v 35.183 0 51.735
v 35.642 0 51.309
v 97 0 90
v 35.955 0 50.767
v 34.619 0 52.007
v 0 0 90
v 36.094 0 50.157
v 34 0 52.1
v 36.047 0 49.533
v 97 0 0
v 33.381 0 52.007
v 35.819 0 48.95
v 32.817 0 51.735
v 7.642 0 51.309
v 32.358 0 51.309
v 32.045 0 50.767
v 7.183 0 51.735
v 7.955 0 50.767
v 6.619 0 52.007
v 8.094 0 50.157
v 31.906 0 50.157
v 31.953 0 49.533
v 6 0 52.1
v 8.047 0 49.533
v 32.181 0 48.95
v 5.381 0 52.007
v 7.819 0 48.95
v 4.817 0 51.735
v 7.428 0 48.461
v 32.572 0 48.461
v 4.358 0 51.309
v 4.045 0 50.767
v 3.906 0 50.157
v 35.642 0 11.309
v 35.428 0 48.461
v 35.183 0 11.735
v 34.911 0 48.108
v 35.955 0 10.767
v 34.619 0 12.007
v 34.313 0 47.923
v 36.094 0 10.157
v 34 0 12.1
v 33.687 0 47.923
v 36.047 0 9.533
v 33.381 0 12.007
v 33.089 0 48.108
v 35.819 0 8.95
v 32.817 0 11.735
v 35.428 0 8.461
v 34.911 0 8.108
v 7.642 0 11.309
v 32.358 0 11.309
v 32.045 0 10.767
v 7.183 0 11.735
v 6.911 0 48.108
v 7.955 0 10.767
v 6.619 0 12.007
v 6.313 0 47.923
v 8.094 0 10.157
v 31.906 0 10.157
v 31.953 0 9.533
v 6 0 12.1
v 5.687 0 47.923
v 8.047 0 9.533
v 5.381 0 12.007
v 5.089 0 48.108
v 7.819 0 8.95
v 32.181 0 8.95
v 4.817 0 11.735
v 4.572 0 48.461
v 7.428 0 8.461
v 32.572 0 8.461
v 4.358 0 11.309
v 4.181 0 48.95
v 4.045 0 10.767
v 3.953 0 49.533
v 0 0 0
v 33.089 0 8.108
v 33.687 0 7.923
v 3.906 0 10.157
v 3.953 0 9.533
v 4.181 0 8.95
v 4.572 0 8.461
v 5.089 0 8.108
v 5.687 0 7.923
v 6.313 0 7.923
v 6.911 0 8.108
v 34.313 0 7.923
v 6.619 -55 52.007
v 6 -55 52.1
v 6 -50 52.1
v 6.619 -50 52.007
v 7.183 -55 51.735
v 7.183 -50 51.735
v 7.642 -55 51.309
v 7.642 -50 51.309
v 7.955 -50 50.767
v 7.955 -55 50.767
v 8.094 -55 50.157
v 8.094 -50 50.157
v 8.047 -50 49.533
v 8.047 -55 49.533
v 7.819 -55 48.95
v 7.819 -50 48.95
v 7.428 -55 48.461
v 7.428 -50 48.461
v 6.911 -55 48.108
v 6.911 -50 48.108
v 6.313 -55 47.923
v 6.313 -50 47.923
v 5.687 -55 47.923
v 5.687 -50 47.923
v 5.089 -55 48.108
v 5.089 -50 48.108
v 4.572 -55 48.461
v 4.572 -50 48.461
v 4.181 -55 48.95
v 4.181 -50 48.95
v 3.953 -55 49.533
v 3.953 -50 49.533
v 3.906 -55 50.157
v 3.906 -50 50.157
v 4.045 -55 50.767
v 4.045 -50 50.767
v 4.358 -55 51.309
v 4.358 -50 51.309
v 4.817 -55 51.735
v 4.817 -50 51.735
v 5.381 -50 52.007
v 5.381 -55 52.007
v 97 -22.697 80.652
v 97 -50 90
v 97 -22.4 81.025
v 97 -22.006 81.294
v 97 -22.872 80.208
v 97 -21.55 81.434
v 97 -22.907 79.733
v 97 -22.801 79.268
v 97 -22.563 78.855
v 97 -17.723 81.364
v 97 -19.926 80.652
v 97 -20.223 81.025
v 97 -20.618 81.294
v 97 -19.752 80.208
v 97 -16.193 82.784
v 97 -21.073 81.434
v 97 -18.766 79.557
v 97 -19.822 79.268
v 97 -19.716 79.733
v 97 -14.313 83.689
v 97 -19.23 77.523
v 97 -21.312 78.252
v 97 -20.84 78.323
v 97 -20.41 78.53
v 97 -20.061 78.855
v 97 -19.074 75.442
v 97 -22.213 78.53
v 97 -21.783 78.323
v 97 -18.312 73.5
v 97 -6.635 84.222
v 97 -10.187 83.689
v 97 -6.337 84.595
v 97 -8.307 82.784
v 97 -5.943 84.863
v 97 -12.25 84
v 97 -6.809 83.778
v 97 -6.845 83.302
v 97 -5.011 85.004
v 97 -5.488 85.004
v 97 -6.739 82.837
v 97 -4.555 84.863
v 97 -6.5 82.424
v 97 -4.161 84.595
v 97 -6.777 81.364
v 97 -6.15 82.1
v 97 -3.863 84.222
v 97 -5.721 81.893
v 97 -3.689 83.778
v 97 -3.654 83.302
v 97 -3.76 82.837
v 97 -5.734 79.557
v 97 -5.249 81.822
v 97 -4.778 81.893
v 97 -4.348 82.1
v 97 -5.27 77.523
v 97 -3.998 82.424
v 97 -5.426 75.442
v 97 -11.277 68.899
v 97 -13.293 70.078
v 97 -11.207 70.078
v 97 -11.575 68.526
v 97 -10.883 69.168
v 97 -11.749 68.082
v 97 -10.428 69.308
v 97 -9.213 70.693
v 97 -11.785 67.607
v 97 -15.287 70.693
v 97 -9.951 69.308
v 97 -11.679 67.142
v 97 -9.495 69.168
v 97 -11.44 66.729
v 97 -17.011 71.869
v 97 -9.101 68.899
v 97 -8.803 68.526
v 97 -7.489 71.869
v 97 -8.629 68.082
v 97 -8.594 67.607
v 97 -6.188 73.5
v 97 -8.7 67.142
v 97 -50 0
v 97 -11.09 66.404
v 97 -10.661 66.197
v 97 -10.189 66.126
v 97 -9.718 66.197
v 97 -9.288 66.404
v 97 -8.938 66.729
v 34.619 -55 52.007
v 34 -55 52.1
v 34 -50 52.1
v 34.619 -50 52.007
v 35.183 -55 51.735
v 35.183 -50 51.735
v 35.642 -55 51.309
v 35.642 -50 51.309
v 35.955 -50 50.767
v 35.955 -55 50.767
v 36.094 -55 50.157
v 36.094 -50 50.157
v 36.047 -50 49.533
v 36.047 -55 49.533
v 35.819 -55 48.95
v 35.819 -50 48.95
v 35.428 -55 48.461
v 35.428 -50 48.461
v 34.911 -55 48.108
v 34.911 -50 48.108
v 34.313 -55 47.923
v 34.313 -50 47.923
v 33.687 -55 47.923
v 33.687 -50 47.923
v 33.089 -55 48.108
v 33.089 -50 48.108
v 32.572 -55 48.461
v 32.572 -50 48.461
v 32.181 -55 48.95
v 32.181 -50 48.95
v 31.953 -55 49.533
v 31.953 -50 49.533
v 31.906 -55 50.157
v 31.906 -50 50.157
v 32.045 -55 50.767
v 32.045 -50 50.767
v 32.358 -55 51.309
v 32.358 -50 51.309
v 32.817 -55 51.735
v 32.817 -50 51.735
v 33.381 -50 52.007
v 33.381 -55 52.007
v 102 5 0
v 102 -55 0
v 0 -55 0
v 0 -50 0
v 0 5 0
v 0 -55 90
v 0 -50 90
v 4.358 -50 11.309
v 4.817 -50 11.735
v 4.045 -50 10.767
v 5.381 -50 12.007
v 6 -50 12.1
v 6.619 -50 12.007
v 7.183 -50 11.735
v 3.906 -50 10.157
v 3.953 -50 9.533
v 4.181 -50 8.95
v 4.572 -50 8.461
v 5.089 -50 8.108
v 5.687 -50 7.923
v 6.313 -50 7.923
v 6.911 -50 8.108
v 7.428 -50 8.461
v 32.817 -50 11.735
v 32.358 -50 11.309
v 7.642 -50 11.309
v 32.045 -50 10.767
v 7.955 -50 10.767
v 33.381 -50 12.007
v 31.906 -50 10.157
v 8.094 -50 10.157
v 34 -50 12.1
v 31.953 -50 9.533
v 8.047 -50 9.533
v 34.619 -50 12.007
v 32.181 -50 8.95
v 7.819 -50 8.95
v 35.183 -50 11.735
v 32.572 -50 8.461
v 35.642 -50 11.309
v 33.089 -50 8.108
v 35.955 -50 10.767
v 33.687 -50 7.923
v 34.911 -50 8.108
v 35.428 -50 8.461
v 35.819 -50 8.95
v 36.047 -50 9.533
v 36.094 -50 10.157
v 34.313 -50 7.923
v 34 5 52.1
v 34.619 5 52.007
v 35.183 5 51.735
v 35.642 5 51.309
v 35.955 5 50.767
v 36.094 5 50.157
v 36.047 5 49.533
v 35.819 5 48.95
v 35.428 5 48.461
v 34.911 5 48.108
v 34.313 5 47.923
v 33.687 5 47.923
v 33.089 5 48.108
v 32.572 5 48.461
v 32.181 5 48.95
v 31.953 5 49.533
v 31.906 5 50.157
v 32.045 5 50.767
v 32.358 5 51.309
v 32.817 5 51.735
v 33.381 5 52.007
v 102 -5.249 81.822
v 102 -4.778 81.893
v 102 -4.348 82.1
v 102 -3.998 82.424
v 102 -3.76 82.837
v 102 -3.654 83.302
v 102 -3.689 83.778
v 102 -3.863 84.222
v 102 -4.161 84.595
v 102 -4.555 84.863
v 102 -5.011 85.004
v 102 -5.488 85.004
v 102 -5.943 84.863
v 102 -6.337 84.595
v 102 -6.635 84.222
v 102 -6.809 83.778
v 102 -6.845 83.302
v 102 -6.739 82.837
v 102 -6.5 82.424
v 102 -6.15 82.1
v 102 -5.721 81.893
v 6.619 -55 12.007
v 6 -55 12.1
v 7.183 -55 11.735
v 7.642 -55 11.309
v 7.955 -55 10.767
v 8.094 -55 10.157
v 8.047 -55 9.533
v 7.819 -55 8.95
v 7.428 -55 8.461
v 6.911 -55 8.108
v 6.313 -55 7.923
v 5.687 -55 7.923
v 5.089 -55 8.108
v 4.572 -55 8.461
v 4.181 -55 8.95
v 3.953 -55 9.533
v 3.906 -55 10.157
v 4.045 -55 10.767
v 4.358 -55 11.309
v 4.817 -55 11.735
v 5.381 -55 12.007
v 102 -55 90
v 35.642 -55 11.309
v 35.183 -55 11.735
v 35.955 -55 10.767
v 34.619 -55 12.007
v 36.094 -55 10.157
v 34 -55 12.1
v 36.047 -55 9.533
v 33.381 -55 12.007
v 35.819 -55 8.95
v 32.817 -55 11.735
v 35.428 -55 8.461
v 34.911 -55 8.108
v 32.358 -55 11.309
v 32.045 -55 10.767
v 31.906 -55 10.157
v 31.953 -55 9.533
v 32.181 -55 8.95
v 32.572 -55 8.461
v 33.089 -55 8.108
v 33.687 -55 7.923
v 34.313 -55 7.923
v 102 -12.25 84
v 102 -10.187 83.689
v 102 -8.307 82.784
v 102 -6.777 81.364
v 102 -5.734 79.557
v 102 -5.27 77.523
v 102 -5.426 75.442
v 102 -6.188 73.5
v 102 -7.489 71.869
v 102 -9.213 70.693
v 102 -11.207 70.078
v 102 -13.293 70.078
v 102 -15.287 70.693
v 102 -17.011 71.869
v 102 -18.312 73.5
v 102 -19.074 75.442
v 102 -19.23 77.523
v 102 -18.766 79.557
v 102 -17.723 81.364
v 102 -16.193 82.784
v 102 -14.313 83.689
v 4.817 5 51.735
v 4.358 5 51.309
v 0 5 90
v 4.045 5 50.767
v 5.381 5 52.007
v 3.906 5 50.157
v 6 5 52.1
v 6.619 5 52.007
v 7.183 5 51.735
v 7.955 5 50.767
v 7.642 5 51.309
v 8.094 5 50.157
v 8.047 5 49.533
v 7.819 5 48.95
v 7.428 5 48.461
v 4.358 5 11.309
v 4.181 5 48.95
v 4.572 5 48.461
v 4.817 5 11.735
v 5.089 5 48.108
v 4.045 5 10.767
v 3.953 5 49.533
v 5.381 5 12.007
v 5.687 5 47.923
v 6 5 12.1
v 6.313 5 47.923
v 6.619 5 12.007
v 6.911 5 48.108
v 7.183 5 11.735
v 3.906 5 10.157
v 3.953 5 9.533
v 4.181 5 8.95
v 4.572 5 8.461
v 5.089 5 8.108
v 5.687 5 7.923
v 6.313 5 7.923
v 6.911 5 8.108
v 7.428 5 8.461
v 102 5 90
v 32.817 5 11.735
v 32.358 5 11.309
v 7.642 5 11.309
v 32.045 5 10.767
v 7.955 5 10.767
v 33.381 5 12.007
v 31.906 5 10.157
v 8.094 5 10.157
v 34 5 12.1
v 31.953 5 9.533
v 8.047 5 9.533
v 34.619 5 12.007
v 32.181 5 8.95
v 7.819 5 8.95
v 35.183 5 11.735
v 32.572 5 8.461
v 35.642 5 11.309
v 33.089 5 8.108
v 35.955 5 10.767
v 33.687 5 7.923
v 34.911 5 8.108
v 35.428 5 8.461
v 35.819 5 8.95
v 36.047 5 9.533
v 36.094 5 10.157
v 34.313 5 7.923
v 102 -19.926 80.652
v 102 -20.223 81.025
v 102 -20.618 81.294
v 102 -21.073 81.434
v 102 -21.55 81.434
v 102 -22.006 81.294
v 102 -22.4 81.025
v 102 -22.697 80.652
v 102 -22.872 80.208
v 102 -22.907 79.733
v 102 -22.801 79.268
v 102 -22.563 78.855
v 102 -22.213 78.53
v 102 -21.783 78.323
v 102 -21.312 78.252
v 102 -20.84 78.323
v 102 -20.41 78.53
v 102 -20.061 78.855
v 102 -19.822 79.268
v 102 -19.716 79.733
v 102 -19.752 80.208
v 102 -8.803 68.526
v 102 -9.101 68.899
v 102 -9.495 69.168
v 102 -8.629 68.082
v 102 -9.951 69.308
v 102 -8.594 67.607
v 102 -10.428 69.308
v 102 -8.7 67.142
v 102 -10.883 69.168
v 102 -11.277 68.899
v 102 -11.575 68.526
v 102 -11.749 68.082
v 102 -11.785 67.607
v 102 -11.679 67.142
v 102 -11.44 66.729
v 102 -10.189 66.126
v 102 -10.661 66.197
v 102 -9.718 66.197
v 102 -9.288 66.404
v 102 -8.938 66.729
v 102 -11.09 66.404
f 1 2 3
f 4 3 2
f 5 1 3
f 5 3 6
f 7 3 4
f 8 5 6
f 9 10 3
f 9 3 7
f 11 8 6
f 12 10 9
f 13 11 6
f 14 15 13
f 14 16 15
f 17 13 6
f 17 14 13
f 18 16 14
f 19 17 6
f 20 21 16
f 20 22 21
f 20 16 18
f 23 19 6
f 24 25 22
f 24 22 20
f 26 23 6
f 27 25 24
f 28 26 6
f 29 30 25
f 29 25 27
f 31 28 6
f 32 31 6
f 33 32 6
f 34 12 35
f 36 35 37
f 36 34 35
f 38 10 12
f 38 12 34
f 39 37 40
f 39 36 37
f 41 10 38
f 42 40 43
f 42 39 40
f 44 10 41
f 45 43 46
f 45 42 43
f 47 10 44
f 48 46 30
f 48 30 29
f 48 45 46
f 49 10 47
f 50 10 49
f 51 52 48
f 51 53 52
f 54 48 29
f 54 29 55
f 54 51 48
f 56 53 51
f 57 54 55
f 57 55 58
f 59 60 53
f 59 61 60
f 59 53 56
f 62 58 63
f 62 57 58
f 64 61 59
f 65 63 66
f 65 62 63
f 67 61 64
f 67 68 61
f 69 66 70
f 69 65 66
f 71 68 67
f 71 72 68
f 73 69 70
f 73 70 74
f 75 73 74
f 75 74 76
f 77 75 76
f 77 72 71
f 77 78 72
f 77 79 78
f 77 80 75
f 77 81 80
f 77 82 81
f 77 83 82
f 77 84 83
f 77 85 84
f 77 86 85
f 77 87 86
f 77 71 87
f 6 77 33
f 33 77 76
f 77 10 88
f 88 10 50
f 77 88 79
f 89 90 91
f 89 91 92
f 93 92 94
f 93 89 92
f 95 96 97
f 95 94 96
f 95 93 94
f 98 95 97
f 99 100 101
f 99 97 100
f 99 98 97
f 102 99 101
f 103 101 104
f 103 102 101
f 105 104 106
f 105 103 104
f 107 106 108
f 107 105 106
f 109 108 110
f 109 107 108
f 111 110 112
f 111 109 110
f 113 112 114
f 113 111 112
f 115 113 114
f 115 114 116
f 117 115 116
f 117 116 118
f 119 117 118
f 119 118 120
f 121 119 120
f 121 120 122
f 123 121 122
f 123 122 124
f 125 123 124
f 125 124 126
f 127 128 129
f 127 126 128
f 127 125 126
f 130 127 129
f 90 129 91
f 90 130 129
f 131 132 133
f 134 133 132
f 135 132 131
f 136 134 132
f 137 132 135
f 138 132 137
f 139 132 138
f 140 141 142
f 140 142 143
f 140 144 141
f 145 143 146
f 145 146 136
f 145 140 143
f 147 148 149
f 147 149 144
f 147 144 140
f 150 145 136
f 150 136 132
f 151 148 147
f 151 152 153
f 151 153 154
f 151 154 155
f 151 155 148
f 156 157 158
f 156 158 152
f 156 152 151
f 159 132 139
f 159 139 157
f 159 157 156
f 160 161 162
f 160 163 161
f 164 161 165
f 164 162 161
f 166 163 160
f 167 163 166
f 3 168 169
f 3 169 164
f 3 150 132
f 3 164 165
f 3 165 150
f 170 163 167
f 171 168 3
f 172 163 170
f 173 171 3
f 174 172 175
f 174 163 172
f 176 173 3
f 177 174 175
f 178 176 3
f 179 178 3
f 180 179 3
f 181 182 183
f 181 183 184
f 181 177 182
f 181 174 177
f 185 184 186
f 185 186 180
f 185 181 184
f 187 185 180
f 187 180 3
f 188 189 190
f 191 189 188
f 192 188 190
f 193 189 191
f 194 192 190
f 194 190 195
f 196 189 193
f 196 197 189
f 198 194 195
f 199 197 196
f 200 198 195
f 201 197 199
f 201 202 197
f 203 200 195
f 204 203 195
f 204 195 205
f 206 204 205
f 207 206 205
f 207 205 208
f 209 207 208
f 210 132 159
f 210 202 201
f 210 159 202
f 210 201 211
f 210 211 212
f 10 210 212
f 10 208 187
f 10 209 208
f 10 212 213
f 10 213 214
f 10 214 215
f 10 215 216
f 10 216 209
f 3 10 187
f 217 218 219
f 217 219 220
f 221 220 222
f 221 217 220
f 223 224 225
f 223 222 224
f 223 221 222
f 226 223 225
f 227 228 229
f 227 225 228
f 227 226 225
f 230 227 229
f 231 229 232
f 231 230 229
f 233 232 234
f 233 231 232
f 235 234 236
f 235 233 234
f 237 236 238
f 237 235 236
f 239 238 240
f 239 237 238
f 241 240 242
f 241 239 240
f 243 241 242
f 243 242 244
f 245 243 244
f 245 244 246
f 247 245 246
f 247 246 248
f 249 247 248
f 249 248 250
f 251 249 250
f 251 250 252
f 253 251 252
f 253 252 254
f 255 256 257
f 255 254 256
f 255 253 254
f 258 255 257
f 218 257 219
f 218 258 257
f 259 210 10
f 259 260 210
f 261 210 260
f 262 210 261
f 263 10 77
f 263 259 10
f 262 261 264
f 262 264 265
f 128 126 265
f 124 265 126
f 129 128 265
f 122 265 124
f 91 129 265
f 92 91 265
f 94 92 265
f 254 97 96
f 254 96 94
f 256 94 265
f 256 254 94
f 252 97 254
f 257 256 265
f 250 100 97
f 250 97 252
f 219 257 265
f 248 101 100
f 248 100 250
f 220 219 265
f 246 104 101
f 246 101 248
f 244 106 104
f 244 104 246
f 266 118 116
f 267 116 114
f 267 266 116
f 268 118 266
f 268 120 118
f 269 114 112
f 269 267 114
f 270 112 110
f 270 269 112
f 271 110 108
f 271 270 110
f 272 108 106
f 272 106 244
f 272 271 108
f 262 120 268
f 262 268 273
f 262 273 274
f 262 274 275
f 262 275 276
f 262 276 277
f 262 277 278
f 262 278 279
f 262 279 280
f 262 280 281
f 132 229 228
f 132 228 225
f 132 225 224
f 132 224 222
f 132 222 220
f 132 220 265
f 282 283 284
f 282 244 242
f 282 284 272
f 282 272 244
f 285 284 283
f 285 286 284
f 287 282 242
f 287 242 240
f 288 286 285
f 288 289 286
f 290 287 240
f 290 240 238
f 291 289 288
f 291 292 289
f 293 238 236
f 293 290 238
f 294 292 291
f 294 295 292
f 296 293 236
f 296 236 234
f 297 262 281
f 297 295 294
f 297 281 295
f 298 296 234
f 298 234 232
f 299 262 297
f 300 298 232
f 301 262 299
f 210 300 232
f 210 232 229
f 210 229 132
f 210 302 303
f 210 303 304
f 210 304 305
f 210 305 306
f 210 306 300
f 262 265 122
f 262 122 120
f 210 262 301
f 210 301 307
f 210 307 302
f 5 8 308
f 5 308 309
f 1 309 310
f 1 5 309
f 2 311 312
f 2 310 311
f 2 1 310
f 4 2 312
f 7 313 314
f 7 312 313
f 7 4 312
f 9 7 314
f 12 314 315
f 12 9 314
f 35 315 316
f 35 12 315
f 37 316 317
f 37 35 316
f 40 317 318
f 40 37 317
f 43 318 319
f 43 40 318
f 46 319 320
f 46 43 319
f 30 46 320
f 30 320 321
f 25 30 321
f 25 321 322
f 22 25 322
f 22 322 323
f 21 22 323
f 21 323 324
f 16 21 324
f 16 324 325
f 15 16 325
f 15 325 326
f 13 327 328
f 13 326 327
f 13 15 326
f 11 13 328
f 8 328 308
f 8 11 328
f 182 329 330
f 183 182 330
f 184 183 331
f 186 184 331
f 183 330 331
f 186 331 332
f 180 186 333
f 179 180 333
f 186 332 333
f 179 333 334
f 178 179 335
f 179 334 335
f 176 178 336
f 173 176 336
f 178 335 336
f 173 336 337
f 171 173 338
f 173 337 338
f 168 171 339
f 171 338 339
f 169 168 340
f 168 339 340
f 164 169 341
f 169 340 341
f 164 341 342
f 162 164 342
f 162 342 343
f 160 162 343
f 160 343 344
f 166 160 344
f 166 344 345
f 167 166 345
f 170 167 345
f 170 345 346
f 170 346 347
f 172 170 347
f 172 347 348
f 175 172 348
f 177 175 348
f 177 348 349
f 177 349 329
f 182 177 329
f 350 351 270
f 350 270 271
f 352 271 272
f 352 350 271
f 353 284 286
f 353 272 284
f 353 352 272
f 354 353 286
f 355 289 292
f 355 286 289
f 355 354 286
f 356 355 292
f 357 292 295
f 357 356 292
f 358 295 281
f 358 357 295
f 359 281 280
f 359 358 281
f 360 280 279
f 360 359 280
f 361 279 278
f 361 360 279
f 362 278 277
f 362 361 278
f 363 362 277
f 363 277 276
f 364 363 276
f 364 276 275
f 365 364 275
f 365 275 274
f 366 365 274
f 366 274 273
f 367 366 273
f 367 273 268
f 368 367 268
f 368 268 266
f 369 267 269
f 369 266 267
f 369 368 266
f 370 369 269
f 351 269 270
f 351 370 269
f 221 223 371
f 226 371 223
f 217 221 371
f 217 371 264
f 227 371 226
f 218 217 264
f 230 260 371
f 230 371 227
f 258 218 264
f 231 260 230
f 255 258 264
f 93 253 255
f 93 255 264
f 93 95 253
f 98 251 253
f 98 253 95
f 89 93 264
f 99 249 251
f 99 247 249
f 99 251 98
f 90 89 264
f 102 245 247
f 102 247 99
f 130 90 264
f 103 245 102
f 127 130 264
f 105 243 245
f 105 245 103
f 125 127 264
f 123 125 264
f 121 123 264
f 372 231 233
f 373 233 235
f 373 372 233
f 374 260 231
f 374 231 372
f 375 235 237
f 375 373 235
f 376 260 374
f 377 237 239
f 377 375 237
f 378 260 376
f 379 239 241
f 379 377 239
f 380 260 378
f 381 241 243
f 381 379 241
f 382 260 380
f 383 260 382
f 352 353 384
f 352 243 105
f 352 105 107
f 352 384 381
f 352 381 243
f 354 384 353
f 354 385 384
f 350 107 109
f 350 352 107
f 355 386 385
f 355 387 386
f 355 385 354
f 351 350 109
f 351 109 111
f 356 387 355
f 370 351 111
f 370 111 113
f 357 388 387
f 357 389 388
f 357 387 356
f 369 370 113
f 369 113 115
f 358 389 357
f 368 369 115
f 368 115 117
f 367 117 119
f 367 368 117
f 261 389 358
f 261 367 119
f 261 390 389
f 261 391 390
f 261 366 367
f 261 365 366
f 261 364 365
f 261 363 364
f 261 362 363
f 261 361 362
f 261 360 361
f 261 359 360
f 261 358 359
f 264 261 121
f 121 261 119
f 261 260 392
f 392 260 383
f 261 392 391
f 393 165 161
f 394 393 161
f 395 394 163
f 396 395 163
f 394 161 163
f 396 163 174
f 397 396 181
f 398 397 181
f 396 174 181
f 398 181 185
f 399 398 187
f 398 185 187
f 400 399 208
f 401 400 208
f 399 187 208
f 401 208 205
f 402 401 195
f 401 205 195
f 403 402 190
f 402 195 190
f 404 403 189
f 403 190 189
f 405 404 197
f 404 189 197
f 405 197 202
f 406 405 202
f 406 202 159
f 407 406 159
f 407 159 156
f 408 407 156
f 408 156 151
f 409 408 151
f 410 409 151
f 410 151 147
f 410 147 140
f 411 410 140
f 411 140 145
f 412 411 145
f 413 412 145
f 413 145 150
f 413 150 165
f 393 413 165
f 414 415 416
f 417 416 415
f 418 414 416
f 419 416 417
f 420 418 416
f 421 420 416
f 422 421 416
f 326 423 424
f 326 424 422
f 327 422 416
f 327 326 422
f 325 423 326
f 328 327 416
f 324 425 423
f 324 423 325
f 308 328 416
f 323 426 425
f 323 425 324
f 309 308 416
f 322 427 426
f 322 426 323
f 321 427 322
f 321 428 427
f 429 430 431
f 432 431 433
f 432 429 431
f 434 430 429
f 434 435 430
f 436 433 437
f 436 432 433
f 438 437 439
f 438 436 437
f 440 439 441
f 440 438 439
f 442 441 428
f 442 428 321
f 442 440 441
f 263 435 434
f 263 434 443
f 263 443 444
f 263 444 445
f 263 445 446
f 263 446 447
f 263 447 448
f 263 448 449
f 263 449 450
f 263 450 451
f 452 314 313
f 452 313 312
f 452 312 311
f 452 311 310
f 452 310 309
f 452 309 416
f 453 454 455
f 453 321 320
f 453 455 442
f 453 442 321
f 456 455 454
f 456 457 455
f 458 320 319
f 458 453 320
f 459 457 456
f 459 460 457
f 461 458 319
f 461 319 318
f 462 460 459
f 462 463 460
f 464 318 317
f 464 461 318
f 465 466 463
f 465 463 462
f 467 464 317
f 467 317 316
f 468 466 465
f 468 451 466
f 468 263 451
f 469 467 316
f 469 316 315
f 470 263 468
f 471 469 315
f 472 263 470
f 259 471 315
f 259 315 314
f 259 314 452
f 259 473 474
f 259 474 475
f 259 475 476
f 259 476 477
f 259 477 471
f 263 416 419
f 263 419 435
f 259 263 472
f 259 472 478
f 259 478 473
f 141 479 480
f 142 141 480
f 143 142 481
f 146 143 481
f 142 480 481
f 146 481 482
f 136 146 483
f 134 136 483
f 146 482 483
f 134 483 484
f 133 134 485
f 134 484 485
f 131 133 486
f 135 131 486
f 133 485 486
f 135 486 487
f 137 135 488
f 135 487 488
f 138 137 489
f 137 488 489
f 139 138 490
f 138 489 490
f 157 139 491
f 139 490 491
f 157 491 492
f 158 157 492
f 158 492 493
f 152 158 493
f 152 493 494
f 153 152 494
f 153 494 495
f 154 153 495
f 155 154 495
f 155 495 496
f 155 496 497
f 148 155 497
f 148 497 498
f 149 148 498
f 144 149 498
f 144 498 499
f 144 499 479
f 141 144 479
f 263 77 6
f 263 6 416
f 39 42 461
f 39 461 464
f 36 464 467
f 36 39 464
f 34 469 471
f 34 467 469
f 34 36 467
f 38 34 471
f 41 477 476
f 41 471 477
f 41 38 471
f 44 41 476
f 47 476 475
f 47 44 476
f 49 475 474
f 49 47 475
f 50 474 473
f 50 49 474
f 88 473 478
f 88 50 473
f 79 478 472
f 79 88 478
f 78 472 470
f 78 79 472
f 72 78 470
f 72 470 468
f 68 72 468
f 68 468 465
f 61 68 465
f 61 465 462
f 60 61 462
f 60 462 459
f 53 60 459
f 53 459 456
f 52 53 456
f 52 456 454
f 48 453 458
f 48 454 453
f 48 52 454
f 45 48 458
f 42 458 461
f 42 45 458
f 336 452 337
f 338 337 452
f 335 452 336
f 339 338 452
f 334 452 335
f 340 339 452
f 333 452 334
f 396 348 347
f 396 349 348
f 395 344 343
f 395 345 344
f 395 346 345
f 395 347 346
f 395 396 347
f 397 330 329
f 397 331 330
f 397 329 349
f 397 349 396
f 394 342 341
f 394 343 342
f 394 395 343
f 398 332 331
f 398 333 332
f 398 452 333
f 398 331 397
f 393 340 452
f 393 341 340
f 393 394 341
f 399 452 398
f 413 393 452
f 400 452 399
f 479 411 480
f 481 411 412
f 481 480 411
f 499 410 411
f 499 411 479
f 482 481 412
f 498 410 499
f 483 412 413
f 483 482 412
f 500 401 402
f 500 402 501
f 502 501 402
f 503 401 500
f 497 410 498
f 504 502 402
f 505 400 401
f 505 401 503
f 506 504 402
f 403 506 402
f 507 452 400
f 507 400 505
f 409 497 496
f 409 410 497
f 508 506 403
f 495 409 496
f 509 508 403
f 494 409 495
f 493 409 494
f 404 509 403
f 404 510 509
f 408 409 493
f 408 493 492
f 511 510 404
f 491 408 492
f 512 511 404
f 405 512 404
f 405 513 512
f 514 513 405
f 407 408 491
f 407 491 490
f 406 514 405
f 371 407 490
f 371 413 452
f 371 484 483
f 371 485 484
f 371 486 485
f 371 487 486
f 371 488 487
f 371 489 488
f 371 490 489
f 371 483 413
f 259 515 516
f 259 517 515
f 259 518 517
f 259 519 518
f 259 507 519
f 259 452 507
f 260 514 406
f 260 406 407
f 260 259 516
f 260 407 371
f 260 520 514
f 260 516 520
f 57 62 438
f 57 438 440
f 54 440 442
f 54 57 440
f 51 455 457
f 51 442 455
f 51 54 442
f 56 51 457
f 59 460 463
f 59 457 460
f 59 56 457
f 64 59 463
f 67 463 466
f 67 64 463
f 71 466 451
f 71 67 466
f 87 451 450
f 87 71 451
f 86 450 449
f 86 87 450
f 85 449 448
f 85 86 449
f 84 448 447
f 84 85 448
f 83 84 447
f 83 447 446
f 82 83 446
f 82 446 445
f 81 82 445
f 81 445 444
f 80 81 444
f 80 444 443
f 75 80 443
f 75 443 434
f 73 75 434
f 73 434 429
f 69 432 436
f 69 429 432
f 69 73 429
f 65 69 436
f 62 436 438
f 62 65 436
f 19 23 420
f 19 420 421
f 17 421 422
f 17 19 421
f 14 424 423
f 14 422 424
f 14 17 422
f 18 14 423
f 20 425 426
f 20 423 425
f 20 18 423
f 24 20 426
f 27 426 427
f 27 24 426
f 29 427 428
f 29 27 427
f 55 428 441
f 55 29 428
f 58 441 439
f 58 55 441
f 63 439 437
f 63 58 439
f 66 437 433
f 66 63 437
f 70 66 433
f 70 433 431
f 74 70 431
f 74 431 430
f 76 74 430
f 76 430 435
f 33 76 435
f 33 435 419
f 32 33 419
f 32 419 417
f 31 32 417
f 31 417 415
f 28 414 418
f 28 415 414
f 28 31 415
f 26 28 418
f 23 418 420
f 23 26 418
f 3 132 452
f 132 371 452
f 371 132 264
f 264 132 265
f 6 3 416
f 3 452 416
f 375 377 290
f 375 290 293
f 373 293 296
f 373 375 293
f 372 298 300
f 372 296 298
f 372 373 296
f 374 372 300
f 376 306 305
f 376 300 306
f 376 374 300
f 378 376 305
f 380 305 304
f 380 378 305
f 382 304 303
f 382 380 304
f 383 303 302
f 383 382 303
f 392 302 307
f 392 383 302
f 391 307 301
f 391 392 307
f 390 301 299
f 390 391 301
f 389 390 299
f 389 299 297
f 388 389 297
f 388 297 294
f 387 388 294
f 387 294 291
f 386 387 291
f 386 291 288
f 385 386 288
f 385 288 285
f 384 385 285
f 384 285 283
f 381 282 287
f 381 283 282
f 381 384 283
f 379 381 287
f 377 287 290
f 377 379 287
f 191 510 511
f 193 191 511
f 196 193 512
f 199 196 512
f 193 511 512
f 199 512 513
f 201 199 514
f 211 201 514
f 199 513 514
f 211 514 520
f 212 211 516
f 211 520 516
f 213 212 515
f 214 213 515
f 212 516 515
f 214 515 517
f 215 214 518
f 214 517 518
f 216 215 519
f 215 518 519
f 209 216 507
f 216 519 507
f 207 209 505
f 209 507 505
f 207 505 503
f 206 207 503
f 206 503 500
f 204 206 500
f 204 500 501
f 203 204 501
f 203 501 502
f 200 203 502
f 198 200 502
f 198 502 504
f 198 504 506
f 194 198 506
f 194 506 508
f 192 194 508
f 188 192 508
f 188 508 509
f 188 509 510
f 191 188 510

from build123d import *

# Parameters (mm, degrees)
EXTRUDE_1_DEPTH          = 90
CUT_EXTRUDE1_DEPTH       = 147.727638841
CUT_EXTRUDE1_DEPTH_BACK  = 147.727638841
SKETCH1_R                = 2.1
SKETCH_2_R               = 7
CUT_EXTRUDE_1_DEPTH      = 10
SKETCH_6_R               = 1.6
CUT_EXTRUDE_3_DEPTH      = 10
PATTERN_CIRCULAR_1_COUNT = 3


with BuildPart() as part:
    # 草图1 → 凸台-拉伸1 (new body)
    with BuildSketch(Plane.XY):
        Polygon((0, 0), (0, 5), (102, 5), (102, -55), (0, -55), (0, -50), (97, -50), (97, 0), align=None)
    extrude(amount=EXTRUDE_1_DEPTH)

    # Sketch1 → Cut-Extrude1 (cut, two sides: drawn at the far end of the back side and taken through both)
    with BuildSketch(Plane(origin=(0, 0, 0), x_dir=(1, 0, 0), z_dir=(0, 1, 0)).offset(-CUT_EXTRUDE1_DEPTH_BACK)):
        with Locations(Location((6, -10, 0), (0, 0, 270))):
            Circle(SKETCH1_R)
        with Locations(Location((34, -10, 0), (0, 0, 270))):
            Circle(SKETCH1_R)
        with Locations(Location((34, -50, 0), (0, 0, 270))):
            Circle(SKETCH1_R)
        with Locations(Location((6, -50, 0), (0, 0, 270))):
            Circle(SKETCH1_R)
    extrude(amount=CUT_EXTRUDE1_DEPTH + CUT_EXTRUDE1_DEPTH_BACK, mode=Mode.SUBTRACT)

    # 草图2 → 切除-拉伸1 (cut)
    with BuildSketch(Plane.ZY.offset(-97)):
        with Locations((77, -12.25)):
            Circle(SKETCH_2_R)
    extrude(amount=-CUT_EXTRUDE_1_DEPTH, mode=Mode.SUBTRACT)

    # 草图6 → 切除-拉伸3 (cut)
    with BuildSketch(Plane(origin=(102, 0, 0), x_dir=(0, 0, -1), z_dir=(1, 0, 0))):
        with Locations((-83.421648209, -5.249111894)):
            Circle(SKETCH_6_R)
    cut_extrude_3 = extrude(amount=-CUT_EXTRUDE_3_DEPTH, mode=Mode.SUBTRACT)

    # 阵列(圆周)1: 切除-拉伸3 ×3 about axis
    pattern_circular_1_axis = Axis((0, -12.25, 77), (1, 0, 0))
    for i in range(1, PATTERN_CIRCULAR_1_COUNT):
        add(cut_extrude_3.rotate(pattern_circular_1_axis, i * 360 / PATTERN_CIRCULAR_1_COUNT), mode=Mode.SUBTRACT)


solid = part.part
